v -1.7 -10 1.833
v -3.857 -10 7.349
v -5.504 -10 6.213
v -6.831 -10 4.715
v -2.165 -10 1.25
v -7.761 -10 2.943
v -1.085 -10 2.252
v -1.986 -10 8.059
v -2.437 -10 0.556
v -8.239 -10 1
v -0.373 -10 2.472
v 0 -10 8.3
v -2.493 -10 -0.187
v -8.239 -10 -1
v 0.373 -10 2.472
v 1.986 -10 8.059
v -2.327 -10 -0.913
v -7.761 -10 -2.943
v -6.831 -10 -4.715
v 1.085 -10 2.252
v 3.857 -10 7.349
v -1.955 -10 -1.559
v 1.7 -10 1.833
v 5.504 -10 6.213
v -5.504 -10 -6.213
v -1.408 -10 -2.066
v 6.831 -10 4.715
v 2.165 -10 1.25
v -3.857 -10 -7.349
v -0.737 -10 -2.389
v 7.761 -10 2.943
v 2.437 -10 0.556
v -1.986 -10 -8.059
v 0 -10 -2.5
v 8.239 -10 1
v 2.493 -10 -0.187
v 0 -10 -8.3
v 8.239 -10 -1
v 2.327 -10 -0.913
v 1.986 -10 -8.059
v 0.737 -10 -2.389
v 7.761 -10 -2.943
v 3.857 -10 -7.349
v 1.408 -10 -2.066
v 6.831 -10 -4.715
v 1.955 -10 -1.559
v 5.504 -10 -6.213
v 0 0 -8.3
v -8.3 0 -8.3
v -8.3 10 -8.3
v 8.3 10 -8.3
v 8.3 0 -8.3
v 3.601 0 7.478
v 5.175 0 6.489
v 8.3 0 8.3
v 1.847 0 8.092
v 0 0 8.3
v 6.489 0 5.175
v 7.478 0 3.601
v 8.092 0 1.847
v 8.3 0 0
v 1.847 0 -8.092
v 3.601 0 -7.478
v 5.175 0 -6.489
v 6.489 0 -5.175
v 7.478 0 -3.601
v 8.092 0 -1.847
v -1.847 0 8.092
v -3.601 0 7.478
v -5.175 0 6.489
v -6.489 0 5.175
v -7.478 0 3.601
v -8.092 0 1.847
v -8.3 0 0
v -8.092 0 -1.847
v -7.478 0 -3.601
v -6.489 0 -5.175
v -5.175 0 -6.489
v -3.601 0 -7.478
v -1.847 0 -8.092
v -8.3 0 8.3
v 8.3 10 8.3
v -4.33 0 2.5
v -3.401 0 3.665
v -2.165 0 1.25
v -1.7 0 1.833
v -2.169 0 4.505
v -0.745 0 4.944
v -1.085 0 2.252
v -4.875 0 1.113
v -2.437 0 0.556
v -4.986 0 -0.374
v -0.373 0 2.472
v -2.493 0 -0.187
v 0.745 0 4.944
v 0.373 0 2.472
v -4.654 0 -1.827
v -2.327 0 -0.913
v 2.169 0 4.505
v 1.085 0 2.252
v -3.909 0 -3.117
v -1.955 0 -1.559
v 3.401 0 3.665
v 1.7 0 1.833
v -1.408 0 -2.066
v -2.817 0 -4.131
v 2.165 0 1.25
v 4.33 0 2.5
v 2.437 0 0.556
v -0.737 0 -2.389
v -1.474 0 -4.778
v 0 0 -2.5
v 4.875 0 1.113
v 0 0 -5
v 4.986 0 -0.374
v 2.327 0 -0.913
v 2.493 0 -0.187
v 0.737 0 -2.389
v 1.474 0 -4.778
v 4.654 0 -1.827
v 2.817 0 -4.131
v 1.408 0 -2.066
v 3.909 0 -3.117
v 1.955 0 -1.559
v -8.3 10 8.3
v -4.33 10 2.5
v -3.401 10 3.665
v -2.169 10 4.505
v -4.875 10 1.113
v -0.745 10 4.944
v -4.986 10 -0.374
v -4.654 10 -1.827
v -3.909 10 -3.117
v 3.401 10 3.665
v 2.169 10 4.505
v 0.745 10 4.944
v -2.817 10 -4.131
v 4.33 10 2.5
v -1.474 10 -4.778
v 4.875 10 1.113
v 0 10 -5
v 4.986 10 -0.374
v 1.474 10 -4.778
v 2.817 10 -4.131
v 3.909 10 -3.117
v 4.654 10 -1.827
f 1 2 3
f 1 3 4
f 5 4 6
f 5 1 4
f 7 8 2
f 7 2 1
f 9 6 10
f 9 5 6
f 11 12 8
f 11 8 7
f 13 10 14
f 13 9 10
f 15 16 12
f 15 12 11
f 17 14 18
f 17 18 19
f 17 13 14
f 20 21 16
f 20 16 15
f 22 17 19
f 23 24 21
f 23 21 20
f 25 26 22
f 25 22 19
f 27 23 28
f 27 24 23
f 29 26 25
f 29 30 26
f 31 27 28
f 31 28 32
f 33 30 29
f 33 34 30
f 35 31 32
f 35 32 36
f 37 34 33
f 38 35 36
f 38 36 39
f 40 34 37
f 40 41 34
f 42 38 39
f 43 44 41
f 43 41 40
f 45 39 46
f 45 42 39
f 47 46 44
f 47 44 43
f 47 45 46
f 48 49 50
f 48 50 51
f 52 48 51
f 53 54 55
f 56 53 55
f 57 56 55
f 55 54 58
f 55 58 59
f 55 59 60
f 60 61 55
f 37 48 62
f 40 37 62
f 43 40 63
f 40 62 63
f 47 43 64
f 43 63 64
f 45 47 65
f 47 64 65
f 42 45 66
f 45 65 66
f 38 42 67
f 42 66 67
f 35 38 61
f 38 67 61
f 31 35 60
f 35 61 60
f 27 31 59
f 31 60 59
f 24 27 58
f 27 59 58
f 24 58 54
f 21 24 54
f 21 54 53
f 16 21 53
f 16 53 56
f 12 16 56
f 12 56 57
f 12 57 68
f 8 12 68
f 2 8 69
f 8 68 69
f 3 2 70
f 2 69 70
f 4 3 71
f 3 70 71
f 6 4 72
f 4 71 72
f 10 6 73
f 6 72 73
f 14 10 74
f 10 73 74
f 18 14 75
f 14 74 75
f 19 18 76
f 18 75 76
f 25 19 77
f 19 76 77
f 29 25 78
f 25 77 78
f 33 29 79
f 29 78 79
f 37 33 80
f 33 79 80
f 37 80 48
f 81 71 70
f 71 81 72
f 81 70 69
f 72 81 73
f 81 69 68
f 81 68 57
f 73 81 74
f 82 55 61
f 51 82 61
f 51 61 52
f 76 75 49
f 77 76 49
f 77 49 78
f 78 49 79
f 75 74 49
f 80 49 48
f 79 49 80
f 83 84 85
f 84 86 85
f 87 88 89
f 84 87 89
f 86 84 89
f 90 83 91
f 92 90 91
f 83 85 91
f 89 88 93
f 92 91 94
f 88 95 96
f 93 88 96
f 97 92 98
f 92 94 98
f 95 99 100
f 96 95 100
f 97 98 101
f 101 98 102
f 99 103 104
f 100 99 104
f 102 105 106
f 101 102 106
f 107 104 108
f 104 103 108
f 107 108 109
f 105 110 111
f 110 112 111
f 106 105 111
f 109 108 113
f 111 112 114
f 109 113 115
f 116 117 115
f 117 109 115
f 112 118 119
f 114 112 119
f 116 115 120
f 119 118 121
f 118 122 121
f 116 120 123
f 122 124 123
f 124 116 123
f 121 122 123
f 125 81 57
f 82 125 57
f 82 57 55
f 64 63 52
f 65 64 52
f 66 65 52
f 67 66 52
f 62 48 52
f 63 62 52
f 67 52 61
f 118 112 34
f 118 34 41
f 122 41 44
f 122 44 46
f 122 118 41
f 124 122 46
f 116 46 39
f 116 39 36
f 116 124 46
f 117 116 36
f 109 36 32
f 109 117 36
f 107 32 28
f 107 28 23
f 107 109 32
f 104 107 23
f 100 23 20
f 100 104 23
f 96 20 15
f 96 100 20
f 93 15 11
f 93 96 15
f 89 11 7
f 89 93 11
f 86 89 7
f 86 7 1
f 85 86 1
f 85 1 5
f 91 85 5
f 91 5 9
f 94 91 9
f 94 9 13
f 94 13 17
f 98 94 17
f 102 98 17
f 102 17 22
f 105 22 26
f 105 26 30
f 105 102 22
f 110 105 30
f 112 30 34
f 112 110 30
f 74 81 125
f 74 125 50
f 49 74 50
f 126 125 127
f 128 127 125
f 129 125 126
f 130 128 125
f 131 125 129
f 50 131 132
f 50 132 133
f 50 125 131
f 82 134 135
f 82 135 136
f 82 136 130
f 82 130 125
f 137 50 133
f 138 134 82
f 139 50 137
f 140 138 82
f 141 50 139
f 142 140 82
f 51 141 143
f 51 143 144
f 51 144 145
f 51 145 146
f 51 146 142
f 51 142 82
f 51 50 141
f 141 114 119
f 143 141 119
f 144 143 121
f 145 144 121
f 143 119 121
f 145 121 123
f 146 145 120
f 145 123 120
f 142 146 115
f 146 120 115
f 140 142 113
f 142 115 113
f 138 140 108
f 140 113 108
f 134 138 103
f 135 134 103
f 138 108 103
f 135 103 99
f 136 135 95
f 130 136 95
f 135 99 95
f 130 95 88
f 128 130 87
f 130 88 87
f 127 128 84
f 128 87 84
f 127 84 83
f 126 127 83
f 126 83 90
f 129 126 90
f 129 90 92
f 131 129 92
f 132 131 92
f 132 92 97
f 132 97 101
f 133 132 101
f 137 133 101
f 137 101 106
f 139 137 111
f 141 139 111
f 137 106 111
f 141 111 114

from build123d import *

# Parameters (mm, degrees)
SKETCH1_W           = 16.6
SKETCH1_H           = 16.6
BOSS_EXTRUDE1_DEPTH = 10
SKETCH3_R           = 5
CUT_EXTRUDE1_DEPTH  = 10
SKETCH4_R           = 8.3
SKETCH4_R_2         = 2.5
BOSS_EXTRUDE2_DEPTH = 10


with BuildPart() as part:
    # Sketch1 → Boss-Extrude1 (new body)
    with BuildSketch(Plane(origin=(0, 0, 0), x_dir=(1, 0, 0), z_dir=(0, 1, 0))):
        Rectangle(SKETCH1_W, SKETCH1_H)
    extrude(amount=BOSS_EXTRUDE1_DEPTH)

    # Sketch3 → Cut-Extrude1 (cut)
    with BuildSketch(Plane.XZ):
        with Locations(Location((0, 0, 0), (0, 0, 270))):
            Circle(SKETCH3_R)
    extrude(amount=-CUT_EXTRUDE1_DEPTH, mode=Mode.SUBTRACT)

    # Sketch4 → Boss-Extrude2 (add)
    with BuildSketch(Plane.XZ):
        with Locations(Location((0, 0, 0), (0, 0, 270))):
            Circle(SKETCH4_R)
        with Locations(Location((0, 0, 0), (0, 0, 270))):
            Circle(SKETCH4_R_2, mode=Mode.SUBTRACT)
    extrude(amount=BOSS_EXTRUDE2_DEPTH)


solid = part.part
